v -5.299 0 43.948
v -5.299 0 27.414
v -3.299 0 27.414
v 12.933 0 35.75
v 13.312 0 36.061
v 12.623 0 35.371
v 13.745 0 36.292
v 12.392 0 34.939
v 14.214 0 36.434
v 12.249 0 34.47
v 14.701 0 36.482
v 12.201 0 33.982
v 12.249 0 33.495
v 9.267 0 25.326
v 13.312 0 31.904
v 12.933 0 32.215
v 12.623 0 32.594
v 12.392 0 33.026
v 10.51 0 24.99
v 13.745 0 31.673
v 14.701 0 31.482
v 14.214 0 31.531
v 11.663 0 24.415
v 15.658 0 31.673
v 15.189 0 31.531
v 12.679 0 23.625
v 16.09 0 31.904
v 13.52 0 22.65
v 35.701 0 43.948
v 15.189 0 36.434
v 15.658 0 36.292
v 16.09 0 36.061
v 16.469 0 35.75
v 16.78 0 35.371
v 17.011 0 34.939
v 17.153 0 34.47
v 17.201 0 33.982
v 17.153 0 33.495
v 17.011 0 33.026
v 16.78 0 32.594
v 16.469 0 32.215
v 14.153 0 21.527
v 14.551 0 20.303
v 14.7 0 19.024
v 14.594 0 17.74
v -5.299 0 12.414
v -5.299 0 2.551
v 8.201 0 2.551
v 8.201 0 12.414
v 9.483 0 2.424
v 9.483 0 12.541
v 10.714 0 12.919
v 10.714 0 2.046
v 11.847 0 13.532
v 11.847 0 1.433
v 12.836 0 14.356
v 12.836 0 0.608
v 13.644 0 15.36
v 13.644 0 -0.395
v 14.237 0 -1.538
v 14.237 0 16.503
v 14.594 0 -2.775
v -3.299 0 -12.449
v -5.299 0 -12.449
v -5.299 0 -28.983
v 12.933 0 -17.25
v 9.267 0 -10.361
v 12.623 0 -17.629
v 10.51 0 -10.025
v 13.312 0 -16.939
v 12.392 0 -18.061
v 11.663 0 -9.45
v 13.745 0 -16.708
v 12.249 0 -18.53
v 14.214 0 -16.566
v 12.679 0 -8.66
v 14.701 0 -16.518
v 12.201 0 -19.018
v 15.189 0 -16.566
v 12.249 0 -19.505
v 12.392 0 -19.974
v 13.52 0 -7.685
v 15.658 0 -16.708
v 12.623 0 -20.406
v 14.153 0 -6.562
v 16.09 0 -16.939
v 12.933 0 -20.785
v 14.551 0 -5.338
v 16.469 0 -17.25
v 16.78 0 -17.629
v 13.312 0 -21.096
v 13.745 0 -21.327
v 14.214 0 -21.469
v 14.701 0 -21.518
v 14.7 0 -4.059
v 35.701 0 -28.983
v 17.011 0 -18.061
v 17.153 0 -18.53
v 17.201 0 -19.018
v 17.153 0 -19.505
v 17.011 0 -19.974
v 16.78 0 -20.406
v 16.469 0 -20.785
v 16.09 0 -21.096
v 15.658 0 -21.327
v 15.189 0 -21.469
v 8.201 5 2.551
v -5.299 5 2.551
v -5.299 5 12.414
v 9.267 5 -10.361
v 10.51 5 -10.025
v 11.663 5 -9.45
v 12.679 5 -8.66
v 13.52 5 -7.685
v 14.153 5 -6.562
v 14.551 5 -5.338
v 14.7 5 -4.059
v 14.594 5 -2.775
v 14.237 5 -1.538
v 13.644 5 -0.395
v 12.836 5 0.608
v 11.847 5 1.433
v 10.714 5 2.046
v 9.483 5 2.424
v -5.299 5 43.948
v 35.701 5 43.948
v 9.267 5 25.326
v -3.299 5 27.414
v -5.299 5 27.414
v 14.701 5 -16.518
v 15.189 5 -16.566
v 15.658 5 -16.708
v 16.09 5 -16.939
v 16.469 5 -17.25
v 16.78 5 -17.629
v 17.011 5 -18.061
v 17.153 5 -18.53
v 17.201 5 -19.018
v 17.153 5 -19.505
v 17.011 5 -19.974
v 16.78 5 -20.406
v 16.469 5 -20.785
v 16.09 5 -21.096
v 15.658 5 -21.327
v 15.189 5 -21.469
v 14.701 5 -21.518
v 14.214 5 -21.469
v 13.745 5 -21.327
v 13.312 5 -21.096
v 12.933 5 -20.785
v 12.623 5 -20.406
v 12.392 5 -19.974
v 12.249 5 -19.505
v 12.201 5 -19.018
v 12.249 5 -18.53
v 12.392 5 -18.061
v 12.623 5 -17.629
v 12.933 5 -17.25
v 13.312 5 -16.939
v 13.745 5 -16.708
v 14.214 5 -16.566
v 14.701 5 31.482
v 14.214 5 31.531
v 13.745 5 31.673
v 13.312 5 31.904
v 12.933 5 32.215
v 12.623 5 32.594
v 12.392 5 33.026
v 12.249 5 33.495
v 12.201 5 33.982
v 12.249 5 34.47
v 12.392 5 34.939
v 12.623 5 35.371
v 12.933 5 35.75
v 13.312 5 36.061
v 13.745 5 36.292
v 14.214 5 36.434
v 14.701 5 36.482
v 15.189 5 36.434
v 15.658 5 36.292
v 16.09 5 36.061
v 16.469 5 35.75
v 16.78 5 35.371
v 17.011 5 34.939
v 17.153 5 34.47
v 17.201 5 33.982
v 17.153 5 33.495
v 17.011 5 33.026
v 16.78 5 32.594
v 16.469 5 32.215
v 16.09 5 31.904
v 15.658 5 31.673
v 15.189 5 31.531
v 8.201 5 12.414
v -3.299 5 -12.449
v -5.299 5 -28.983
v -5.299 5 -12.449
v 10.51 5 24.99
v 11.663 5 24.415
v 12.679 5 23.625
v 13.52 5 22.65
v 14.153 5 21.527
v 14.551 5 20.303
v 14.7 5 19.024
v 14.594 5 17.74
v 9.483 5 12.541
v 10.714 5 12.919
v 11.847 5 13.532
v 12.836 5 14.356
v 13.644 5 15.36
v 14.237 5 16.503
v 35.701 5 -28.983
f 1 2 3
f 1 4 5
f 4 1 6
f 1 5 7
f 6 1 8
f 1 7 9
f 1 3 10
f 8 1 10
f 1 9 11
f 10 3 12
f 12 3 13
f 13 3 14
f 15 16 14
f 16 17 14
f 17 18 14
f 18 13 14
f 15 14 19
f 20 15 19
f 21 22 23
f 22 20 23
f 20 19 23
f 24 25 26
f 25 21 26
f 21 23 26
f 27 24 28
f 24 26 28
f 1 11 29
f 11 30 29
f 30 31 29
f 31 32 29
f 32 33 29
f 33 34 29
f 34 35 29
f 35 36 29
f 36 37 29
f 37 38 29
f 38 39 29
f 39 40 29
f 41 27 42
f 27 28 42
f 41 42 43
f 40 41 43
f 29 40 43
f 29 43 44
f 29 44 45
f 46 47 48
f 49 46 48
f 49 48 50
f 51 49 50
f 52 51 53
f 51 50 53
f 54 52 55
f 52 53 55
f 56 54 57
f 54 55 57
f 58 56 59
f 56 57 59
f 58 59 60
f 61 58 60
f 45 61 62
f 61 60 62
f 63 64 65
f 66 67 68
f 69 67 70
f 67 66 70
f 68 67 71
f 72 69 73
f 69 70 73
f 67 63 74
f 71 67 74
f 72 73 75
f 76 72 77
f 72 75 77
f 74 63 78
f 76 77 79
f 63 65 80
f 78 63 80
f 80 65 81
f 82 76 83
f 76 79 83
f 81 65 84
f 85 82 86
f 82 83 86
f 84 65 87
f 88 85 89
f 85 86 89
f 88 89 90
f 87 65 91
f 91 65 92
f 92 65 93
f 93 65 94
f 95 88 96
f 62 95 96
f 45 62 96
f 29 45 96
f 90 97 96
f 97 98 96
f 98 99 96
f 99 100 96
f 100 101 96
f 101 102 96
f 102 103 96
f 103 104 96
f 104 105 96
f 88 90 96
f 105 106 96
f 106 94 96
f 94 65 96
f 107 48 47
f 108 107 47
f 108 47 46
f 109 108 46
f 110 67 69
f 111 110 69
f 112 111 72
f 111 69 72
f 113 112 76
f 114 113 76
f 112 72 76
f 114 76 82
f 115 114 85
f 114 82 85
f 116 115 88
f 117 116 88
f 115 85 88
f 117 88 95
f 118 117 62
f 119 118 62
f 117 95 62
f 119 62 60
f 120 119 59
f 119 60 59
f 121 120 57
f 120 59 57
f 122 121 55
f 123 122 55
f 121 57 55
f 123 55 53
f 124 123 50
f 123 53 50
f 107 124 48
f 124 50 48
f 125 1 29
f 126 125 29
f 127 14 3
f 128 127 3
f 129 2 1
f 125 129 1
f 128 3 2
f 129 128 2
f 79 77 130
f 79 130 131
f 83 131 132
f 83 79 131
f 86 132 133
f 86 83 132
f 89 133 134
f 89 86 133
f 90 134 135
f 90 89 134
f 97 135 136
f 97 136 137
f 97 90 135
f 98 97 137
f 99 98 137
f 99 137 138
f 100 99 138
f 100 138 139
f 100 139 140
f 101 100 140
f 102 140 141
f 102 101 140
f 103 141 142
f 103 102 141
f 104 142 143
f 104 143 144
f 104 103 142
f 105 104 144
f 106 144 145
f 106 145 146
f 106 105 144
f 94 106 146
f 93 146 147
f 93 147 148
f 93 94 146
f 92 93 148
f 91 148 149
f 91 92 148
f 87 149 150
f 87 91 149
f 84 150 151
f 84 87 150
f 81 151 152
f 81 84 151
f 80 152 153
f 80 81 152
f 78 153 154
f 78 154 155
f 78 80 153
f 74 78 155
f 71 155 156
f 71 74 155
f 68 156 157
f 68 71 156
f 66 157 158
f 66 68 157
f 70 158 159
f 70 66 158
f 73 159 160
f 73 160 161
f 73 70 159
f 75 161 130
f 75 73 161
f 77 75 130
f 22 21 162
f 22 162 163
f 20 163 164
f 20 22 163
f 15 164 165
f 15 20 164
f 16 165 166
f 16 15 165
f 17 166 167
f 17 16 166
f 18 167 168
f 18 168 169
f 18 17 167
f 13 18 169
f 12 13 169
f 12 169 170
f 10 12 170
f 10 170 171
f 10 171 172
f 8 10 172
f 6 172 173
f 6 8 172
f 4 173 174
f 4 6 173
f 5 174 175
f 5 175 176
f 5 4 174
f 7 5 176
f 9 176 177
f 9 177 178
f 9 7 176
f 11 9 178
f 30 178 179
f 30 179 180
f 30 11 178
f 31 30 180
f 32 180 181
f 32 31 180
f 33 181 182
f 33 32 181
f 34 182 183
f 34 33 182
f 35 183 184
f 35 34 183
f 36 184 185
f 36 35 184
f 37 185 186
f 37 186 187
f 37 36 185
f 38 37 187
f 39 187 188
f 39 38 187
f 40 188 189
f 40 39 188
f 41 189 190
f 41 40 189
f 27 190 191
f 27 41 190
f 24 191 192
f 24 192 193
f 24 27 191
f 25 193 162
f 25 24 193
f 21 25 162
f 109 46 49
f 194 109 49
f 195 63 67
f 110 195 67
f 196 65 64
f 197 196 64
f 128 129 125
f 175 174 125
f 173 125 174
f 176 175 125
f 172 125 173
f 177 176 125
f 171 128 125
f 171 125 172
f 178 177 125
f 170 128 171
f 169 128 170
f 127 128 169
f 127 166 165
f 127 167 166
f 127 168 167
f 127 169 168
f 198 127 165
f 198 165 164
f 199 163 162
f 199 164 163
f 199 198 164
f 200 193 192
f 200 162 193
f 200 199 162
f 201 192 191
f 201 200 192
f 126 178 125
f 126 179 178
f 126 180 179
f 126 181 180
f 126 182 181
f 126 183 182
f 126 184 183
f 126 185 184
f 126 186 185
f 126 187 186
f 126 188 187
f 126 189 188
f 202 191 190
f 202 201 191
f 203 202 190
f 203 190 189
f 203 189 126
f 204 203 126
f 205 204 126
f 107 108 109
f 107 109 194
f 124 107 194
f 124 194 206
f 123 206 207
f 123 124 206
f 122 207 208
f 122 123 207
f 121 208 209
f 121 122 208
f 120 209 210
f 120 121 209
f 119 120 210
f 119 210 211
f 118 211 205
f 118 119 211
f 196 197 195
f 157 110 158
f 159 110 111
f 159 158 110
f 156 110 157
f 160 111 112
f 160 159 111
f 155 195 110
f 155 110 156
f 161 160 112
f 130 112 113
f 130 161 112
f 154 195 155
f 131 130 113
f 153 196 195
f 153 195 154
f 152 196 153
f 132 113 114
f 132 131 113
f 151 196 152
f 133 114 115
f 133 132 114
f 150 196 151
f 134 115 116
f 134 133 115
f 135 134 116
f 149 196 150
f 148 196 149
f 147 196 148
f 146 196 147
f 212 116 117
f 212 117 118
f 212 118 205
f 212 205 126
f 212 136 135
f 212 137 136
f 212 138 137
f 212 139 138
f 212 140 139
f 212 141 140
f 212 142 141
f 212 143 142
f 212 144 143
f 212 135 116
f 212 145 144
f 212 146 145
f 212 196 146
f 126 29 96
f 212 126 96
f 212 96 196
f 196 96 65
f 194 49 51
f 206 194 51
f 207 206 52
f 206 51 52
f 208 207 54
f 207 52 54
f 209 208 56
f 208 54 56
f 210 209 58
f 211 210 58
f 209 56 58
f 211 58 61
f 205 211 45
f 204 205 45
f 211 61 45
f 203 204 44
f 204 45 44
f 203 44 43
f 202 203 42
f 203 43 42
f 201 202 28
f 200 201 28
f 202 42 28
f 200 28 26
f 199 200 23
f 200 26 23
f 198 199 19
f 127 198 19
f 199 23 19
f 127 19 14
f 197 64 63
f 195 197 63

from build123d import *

# Parameters (mm, degrees)
SKETCH2_R           = 2.5
BOSS_EXTRUDE1_DEPTH = 5


with BuildPart() as part:
    # Sketch2 → Boss-Extrude1 (new body)
    with BuildSketch(Plane(origin=(0, 0, 0), x_dir=(1, 0, 0), z_dir=(0, 1, 0))):
        with BuildLine():
            Line((-5.298765278, -43.948074933), (35.701234722, -43.948074933))
            Line((35.701234722, -43.948074933), (35.701234722, 28.983136785))
            Line((35.701234722, 28.983136785), (-5.298765278, 28.983136785))
            Line((-5.298765278, 28.983136785), (-5.298765278, 12.448742644))
            Line((-5.298765278, 12.448742644), (-3.298765278, 12.448742644))
            Line((-3.298765278, 12.448742644), (9.26668749, 10.3608258))
            ThreePointArc((9.26668749, 10.3608258), (14.679218224, 3.414205702), (8.201234722, -2.551257356))
            Line((8.201234722, -2.551257356), (-5.298765278, -2.551257356))
            Line((-5.298765278, -2.551257356), (-5.298765278, -12.413680791))
            Line((-5.298765278, -12.413680791), (8.201234722, -12.413680791))
            ThreePointArc((8.201234722, -12.413680791), (14.679218224, -18.379143849), (9.26668749, -25.325763948))
            Line((9.26668749, -25.325763948), (-3.298765278, -27.413680791))
            Line((-3.298765278, -27.413680791), (-5.298765278, -27.413680791))
            Line((-5.298765278, -27.413680791), (-5.298765278, -43.948074933))
        make_face()
        with Locations(Location((14.701234722, -33.982469074, 0), (0, 0, 90))):
            Circle(SKETCH2_R, mode=Mode.SUBTRACT)
        with Locations(Location((14.701234722, 19.017530926, 0), (0, 0, 270))):
            Circle(SKETCH2_R, mode=Mode.SUBTRACT)
    extrude(amount=BOSS_EXTRUDE1_DEPTH)


solid = part.part
